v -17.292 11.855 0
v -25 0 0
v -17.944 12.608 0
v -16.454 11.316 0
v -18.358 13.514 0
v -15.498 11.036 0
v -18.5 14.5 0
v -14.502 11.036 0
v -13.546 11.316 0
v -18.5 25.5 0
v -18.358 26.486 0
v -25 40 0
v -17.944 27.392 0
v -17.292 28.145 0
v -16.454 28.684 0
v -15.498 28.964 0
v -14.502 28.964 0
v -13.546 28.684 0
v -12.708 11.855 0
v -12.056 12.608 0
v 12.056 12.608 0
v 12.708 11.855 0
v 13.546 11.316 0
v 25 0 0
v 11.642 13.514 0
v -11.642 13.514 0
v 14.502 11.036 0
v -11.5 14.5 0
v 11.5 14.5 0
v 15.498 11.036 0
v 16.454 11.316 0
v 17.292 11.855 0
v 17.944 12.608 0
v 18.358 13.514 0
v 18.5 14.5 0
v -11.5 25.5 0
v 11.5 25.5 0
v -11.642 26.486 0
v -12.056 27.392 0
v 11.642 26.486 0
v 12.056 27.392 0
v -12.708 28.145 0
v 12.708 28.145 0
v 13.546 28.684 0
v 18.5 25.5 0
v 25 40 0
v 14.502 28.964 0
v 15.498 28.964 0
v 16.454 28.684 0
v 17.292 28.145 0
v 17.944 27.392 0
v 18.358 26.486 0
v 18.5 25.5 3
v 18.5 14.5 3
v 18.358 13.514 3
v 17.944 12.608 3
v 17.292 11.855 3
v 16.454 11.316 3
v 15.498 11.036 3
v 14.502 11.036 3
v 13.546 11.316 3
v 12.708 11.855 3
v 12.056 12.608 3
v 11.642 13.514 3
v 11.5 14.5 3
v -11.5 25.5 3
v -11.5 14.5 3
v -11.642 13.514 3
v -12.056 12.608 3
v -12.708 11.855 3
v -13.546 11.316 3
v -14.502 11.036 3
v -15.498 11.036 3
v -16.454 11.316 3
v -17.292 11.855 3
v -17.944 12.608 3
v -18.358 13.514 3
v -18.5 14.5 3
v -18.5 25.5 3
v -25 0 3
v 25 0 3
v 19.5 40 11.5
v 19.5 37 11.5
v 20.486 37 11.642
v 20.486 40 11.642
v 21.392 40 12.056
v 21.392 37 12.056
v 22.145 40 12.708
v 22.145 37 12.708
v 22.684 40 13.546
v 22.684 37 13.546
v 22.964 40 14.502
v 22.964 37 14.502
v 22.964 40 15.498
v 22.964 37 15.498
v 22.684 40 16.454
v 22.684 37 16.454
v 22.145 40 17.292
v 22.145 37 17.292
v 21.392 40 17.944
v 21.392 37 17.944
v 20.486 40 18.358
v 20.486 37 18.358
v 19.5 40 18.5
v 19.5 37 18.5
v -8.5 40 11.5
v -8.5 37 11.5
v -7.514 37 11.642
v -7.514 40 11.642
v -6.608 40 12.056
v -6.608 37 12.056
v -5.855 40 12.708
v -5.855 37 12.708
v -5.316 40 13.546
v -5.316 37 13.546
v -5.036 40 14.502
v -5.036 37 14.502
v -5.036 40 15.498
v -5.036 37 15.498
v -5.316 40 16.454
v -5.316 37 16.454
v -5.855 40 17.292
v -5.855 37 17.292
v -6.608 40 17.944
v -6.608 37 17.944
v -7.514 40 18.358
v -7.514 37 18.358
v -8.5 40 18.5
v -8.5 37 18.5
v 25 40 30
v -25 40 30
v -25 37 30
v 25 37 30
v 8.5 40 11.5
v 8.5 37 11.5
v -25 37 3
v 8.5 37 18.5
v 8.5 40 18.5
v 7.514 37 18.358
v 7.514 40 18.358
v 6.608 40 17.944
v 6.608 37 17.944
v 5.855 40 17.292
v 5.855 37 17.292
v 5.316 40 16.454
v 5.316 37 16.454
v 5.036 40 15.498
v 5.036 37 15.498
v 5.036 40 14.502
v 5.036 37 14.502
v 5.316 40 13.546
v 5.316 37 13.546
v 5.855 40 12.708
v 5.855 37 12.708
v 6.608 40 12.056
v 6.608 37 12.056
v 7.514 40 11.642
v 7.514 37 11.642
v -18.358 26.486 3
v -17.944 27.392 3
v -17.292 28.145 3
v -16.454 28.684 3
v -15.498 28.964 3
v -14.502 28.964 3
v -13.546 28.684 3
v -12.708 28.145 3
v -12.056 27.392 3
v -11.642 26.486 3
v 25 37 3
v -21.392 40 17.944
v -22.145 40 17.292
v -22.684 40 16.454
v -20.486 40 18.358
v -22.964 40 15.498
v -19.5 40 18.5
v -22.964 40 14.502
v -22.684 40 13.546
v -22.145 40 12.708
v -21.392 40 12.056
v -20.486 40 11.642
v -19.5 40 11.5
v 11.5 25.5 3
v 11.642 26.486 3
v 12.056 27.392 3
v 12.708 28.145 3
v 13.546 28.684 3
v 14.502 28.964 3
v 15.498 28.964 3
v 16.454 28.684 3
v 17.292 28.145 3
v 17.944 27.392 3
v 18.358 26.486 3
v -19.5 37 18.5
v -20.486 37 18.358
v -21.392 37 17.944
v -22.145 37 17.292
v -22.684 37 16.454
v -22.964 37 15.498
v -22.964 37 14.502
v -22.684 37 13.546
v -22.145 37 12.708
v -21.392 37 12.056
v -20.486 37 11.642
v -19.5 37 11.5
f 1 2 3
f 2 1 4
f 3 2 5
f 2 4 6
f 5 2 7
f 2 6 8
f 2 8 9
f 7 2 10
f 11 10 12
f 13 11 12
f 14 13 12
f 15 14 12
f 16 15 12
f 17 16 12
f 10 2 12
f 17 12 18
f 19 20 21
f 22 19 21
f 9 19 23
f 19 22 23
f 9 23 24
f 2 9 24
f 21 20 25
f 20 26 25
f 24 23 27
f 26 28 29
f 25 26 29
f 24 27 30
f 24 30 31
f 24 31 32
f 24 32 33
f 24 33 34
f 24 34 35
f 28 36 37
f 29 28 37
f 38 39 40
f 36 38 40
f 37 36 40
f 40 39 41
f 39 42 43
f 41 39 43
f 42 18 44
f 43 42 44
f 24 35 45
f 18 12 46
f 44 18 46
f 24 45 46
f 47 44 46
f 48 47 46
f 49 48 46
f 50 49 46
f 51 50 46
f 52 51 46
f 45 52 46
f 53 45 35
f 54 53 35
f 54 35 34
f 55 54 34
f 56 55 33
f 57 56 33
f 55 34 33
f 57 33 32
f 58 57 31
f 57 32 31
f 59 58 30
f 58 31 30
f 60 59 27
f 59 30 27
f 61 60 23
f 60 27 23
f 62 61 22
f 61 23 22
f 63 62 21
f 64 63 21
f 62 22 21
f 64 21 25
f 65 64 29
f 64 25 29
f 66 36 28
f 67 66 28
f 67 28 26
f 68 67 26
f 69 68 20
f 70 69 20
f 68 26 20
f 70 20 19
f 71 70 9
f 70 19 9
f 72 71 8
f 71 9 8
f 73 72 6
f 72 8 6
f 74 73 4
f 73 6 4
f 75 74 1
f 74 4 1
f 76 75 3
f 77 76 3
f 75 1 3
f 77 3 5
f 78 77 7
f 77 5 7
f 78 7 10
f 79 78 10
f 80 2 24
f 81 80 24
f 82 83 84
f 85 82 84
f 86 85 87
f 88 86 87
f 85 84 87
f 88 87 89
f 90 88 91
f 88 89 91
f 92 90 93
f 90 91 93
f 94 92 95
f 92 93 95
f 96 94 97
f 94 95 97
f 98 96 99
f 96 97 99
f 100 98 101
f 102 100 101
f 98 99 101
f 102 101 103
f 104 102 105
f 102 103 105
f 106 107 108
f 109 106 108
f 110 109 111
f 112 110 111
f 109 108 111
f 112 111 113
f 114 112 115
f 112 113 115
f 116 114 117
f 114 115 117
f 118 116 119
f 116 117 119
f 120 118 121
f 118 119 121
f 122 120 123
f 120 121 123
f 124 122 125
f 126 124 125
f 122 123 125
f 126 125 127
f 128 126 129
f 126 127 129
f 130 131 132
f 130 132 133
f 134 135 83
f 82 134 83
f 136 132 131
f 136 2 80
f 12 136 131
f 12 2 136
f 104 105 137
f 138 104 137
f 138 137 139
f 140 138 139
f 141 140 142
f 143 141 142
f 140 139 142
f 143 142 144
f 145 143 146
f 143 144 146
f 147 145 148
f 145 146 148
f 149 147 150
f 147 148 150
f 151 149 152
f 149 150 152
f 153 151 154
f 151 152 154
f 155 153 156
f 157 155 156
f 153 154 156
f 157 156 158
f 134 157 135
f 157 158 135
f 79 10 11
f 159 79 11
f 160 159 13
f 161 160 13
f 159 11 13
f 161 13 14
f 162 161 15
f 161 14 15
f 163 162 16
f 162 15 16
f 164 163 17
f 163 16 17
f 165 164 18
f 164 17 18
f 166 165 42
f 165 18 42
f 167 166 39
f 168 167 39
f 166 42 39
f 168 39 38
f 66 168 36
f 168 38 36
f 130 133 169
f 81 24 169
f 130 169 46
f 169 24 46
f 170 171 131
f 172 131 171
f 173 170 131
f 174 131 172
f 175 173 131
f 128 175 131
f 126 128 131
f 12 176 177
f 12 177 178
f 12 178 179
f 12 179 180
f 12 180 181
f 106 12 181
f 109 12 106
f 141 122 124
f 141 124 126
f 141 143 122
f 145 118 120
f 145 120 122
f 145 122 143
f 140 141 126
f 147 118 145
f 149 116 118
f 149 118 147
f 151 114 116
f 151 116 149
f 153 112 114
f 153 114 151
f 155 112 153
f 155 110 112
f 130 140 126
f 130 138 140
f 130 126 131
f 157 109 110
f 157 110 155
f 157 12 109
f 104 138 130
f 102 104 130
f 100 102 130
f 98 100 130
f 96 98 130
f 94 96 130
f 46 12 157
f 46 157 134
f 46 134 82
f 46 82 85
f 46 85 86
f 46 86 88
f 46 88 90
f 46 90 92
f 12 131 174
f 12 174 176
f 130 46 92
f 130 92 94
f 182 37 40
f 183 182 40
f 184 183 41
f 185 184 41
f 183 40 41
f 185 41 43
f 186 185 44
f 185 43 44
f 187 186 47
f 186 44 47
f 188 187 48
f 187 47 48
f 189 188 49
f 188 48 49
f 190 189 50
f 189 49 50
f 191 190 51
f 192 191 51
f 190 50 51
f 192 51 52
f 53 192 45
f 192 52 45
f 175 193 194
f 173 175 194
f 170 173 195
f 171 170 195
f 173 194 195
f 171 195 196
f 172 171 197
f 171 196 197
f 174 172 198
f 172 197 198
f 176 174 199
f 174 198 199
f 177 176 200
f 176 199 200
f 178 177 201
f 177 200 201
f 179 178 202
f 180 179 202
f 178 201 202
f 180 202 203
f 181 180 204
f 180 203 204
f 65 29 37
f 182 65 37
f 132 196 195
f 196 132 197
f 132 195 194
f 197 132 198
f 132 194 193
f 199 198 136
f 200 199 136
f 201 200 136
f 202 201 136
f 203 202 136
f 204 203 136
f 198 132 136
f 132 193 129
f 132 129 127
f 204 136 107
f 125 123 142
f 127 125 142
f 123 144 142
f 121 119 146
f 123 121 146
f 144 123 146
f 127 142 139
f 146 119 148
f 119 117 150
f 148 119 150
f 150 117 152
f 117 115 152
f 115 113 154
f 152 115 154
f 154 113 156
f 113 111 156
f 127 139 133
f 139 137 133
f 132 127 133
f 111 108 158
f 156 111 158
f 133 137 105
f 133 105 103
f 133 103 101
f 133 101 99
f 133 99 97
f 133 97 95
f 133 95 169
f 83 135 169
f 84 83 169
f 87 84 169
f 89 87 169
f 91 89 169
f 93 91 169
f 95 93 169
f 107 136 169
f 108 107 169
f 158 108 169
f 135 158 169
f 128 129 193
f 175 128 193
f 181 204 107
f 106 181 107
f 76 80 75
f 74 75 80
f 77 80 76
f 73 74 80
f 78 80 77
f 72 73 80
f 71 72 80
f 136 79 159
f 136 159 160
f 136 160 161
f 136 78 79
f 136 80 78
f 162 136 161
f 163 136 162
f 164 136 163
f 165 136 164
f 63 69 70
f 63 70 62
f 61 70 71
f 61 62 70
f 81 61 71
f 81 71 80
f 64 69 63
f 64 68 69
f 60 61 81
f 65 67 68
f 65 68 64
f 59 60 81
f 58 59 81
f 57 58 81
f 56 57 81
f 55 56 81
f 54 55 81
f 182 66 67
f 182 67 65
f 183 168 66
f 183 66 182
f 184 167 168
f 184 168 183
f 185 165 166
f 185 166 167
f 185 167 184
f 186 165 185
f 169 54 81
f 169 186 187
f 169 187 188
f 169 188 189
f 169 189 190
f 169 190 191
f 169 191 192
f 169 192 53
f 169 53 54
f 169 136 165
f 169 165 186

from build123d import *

# Parameters (mm, degrees)
F0_W     = 50
F0_H     = 40
F1_DEPTH = 3
F2_W     = 50
F2_H     = 3
F3_DEPTH = 27
F5_DEPTH = 3


with BuildPart() as f1:
    # F0 (on Top) → F1 (new body)
    with BuildSketch(Plane.XY):
        with Locations((0, 20)):
            Rectangle(F0_W, F0_H)
        with BuildLine():
            Line((-11.5, 25.5), (-11.5, 14.5))
            ThreePointArc((-11.5, 14.5), (-15, 11), (-18.5, 14.5))
            Line((-18.5, 14.5), (-18.5, 25.5))
            ThreePointArc((-18.5, 25.5), (-15, 29), (-11.5, 25.5))
        make_face(mode=Mode.SUBTRACT)
        with BuildLine():
            Line((11.5, 14.5), (11.5, 25.5))
            ThreePointArc((11.5, 25.5), (15, 29), (18.5, 25.5))
            Line((18.5, 25.5), (18.5, 14.5))
            ThreePointArc((18.5, 14.5), (15, 11), (11.5, 14.5))
        make_face(mode=Mode.SUBTRACT)
    extrude(amount=F1_DEPTH)

    # F2 (on face) → F3 (join)
    with BuildSketch(Plane.XY.offset(3)):
        with Locations((0, 38.5)):
            Rectangle(F2_W, F2_H)
    extrude(amount=F3_DEPTH)

    # F4 (on face) → F5 (cut)
    with BuildSketch(Plane.XZ.offset(-37)):
        with BuildLine():
            Line((-19.5, 11.5), (-8.5, 11.5))
            ThreePointArc((-8.5, 11.5), (-5, 15), (-8.5, 18.5))
            Line((-8.5, 18.5), (-19.5, 18.5))
            ThreePointArc((-19.5, 18.5), (-23, 15), (-19.5, 11.5))
        make_face()
        with BuildLine():
            ThreePointArc((8.5, 18.5), (5, 15), (8.5, 11.5))
            Line((8.5, 11.5), (19.5, 11.5))
            ThreePointArc((19.5, 11.5), (23, 15), (19.5, 18.5))
            Line((19.5, 18.5), (8.5, 18.5))
        make_face()
    extrude(amount=-F5_DEPTH, mode=Mode.SUBTRACT)


solid = f1.part
